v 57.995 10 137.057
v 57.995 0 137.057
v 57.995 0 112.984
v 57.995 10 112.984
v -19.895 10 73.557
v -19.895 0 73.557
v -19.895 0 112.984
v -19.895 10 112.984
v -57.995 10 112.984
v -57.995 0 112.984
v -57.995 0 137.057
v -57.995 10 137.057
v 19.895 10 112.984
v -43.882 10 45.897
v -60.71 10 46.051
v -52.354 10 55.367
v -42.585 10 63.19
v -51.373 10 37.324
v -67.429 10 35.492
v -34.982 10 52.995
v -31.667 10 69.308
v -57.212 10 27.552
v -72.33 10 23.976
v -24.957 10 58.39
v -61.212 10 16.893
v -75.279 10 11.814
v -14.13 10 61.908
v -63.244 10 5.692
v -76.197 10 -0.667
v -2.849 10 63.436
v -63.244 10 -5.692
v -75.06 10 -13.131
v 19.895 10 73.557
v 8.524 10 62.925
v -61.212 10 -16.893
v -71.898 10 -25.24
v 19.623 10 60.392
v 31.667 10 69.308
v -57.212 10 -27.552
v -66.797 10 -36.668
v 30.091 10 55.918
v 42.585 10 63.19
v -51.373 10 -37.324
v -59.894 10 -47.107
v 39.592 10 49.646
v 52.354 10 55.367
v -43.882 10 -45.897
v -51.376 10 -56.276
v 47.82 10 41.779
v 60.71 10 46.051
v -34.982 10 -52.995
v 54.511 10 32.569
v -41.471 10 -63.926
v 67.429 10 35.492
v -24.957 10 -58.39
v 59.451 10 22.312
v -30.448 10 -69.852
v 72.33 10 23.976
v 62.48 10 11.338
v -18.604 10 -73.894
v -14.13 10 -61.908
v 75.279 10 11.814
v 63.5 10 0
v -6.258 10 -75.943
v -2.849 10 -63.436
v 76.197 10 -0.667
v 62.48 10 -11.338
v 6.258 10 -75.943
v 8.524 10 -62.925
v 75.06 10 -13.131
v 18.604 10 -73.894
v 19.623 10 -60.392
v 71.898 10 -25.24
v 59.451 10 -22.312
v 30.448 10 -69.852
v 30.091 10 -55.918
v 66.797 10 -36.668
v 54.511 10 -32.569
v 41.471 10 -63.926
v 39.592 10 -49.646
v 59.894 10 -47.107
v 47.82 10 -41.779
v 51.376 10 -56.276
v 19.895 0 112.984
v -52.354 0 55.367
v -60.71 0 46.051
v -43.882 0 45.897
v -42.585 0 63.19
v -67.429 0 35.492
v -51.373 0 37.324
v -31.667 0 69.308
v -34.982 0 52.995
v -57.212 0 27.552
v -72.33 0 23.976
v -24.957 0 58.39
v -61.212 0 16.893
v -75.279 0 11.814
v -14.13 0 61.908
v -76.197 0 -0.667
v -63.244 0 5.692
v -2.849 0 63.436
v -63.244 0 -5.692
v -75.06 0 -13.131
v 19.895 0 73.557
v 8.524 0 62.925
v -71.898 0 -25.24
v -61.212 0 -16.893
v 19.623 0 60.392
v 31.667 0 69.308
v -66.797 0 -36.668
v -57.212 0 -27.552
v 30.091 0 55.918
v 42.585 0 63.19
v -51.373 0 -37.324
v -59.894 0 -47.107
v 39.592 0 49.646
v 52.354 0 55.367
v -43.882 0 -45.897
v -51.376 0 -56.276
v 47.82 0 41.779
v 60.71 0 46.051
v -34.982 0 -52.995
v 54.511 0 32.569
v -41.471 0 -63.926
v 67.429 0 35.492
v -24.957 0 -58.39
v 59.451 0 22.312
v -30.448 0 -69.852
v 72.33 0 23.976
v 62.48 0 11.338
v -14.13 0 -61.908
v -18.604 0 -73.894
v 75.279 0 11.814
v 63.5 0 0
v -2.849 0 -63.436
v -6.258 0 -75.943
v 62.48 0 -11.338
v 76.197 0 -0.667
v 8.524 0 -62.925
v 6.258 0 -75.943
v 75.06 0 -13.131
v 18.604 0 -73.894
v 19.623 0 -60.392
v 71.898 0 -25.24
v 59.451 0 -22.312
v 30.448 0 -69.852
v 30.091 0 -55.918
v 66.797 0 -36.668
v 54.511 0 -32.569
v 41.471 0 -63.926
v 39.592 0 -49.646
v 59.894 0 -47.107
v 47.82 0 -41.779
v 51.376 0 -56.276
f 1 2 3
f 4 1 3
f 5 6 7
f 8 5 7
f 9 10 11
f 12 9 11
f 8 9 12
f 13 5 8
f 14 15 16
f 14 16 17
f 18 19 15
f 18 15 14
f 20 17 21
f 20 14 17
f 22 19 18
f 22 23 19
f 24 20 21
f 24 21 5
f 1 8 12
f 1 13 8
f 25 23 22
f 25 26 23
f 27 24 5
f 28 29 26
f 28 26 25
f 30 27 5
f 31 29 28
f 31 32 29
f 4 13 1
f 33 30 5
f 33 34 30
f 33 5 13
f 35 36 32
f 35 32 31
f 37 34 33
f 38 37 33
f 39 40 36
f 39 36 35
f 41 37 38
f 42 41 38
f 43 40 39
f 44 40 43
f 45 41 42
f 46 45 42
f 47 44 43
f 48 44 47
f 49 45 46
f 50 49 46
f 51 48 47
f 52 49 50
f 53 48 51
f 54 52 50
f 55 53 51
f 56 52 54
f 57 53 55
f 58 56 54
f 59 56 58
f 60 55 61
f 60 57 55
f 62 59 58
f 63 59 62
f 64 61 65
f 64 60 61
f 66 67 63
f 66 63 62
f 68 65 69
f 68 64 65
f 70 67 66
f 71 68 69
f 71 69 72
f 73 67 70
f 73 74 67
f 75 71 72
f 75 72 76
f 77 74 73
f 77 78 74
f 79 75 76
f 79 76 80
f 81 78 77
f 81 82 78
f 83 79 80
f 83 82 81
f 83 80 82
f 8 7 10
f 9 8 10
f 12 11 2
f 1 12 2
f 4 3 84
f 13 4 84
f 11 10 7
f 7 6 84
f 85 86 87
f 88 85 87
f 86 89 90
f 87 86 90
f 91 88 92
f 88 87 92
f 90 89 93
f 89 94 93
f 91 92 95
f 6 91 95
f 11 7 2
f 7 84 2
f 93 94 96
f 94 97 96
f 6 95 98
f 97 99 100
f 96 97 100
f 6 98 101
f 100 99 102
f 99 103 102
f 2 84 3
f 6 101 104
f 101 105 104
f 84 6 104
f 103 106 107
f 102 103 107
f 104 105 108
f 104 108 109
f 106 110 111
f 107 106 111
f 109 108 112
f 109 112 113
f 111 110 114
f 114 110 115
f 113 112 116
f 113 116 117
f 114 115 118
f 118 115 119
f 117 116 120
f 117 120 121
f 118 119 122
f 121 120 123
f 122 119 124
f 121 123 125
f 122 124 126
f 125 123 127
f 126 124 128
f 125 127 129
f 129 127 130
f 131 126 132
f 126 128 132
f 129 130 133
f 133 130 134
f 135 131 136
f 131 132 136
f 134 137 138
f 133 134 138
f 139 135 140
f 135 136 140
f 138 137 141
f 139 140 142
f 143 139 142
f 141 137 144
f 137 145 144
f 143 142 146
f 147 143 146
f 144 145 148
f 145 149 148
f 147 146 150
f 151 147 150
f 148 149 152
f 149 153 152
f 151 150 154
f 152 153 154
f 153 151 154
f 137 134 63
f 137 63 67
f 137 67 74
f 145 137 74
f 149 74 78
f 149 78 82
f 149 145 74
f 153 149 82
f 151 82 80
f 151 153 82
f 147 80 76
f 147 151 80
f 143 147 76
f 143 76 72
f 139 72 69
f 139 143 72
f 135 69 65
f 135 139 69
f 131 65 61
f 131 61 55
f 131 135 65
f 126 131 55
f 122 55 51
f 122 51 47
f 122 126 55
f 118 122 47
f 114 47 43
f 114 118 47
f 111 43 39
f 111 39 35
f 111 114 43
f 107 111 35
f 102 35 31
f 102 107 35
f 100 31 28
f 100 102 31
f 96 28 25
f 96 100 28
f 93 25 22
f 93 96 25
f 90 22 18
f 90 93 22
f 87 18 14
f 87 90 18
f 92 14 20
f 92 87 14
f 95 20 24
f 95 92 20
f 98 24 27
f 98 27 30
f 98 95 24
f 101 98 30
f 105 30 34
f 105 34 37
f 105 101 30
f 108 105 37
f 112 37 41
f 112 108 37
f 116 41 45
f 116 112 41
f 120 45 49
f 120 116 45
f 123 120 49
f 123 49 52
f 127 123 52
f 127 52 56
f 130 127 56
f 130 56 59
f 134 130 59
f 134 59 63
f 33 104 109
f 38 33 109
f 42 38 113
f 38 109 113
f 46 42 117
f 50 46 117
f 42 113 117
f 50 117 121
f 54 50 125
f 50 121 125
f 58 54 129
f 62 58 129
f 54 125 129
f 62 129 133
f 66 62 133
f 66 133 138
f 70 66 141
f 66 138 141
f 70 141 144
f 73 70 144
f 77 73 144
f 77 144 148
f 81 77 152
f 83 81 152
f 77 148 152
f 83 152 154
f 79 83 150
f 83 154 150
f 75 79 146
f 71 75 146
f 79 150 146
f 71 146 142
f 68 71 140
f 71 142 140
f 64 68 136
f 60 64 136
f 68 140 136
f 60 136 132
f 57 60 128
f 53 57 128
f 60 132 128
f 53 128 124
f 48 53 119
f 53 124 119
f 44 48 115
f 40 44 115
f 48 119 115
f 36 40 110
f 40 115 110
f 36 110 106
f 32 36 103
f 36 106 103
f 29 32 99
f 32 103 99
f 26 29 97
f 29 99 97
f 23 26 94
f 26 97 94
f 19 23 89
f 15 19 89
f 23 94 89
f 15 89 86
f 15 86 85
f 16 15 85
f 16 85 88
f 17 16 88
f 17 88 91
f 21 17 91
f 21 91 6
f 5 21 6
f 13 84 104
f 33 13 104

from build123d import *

# Parameters (mm, degrees)
SKETCH1_R           = 63.5
BOSS_EXTRUDE1_DEPTH = 10


with BuildPart() as part:
    # Sketch1 → Boss-Extrude1 (new body)
    with BuildSketch(Plane(origin=(0, 0, 0), x_dir=(1, 0, 0), z_dir=(0, 1, 0))):
        with BuildLine():
            ThreePointArc((19.89546001, -73.556853324), (0, 76.2), (-19.89546001, -73.556853324))
            Line((-19.89546001, -73.556853324), (-19.89546001, -112.983657034))
            Line((-19.89546001, -112.983657034), (-57.99546001, -112.983657034))
            Line((-57.99546001, -112.983657034), (-57.99546001, -137.056853324))
            Line((-57.99546001, -137.056853324), (57.99546001, -137.056853324))
            Line((57.99546001, -137.056853324), (57.99546001, -112.983657034))
            Line((57.99546001, -112.983657034), (19.89546001, -112.983657034))
            Line((19.89546001, -112.983657034), (19.89546001, -73.556853324))
        make_face()
        Circle(SKETCH1_R, mode=Mode.SUBTRACT)
    extrude(amount=BOSS_EXTRUDE1_DEPTH)


solid = part.part
